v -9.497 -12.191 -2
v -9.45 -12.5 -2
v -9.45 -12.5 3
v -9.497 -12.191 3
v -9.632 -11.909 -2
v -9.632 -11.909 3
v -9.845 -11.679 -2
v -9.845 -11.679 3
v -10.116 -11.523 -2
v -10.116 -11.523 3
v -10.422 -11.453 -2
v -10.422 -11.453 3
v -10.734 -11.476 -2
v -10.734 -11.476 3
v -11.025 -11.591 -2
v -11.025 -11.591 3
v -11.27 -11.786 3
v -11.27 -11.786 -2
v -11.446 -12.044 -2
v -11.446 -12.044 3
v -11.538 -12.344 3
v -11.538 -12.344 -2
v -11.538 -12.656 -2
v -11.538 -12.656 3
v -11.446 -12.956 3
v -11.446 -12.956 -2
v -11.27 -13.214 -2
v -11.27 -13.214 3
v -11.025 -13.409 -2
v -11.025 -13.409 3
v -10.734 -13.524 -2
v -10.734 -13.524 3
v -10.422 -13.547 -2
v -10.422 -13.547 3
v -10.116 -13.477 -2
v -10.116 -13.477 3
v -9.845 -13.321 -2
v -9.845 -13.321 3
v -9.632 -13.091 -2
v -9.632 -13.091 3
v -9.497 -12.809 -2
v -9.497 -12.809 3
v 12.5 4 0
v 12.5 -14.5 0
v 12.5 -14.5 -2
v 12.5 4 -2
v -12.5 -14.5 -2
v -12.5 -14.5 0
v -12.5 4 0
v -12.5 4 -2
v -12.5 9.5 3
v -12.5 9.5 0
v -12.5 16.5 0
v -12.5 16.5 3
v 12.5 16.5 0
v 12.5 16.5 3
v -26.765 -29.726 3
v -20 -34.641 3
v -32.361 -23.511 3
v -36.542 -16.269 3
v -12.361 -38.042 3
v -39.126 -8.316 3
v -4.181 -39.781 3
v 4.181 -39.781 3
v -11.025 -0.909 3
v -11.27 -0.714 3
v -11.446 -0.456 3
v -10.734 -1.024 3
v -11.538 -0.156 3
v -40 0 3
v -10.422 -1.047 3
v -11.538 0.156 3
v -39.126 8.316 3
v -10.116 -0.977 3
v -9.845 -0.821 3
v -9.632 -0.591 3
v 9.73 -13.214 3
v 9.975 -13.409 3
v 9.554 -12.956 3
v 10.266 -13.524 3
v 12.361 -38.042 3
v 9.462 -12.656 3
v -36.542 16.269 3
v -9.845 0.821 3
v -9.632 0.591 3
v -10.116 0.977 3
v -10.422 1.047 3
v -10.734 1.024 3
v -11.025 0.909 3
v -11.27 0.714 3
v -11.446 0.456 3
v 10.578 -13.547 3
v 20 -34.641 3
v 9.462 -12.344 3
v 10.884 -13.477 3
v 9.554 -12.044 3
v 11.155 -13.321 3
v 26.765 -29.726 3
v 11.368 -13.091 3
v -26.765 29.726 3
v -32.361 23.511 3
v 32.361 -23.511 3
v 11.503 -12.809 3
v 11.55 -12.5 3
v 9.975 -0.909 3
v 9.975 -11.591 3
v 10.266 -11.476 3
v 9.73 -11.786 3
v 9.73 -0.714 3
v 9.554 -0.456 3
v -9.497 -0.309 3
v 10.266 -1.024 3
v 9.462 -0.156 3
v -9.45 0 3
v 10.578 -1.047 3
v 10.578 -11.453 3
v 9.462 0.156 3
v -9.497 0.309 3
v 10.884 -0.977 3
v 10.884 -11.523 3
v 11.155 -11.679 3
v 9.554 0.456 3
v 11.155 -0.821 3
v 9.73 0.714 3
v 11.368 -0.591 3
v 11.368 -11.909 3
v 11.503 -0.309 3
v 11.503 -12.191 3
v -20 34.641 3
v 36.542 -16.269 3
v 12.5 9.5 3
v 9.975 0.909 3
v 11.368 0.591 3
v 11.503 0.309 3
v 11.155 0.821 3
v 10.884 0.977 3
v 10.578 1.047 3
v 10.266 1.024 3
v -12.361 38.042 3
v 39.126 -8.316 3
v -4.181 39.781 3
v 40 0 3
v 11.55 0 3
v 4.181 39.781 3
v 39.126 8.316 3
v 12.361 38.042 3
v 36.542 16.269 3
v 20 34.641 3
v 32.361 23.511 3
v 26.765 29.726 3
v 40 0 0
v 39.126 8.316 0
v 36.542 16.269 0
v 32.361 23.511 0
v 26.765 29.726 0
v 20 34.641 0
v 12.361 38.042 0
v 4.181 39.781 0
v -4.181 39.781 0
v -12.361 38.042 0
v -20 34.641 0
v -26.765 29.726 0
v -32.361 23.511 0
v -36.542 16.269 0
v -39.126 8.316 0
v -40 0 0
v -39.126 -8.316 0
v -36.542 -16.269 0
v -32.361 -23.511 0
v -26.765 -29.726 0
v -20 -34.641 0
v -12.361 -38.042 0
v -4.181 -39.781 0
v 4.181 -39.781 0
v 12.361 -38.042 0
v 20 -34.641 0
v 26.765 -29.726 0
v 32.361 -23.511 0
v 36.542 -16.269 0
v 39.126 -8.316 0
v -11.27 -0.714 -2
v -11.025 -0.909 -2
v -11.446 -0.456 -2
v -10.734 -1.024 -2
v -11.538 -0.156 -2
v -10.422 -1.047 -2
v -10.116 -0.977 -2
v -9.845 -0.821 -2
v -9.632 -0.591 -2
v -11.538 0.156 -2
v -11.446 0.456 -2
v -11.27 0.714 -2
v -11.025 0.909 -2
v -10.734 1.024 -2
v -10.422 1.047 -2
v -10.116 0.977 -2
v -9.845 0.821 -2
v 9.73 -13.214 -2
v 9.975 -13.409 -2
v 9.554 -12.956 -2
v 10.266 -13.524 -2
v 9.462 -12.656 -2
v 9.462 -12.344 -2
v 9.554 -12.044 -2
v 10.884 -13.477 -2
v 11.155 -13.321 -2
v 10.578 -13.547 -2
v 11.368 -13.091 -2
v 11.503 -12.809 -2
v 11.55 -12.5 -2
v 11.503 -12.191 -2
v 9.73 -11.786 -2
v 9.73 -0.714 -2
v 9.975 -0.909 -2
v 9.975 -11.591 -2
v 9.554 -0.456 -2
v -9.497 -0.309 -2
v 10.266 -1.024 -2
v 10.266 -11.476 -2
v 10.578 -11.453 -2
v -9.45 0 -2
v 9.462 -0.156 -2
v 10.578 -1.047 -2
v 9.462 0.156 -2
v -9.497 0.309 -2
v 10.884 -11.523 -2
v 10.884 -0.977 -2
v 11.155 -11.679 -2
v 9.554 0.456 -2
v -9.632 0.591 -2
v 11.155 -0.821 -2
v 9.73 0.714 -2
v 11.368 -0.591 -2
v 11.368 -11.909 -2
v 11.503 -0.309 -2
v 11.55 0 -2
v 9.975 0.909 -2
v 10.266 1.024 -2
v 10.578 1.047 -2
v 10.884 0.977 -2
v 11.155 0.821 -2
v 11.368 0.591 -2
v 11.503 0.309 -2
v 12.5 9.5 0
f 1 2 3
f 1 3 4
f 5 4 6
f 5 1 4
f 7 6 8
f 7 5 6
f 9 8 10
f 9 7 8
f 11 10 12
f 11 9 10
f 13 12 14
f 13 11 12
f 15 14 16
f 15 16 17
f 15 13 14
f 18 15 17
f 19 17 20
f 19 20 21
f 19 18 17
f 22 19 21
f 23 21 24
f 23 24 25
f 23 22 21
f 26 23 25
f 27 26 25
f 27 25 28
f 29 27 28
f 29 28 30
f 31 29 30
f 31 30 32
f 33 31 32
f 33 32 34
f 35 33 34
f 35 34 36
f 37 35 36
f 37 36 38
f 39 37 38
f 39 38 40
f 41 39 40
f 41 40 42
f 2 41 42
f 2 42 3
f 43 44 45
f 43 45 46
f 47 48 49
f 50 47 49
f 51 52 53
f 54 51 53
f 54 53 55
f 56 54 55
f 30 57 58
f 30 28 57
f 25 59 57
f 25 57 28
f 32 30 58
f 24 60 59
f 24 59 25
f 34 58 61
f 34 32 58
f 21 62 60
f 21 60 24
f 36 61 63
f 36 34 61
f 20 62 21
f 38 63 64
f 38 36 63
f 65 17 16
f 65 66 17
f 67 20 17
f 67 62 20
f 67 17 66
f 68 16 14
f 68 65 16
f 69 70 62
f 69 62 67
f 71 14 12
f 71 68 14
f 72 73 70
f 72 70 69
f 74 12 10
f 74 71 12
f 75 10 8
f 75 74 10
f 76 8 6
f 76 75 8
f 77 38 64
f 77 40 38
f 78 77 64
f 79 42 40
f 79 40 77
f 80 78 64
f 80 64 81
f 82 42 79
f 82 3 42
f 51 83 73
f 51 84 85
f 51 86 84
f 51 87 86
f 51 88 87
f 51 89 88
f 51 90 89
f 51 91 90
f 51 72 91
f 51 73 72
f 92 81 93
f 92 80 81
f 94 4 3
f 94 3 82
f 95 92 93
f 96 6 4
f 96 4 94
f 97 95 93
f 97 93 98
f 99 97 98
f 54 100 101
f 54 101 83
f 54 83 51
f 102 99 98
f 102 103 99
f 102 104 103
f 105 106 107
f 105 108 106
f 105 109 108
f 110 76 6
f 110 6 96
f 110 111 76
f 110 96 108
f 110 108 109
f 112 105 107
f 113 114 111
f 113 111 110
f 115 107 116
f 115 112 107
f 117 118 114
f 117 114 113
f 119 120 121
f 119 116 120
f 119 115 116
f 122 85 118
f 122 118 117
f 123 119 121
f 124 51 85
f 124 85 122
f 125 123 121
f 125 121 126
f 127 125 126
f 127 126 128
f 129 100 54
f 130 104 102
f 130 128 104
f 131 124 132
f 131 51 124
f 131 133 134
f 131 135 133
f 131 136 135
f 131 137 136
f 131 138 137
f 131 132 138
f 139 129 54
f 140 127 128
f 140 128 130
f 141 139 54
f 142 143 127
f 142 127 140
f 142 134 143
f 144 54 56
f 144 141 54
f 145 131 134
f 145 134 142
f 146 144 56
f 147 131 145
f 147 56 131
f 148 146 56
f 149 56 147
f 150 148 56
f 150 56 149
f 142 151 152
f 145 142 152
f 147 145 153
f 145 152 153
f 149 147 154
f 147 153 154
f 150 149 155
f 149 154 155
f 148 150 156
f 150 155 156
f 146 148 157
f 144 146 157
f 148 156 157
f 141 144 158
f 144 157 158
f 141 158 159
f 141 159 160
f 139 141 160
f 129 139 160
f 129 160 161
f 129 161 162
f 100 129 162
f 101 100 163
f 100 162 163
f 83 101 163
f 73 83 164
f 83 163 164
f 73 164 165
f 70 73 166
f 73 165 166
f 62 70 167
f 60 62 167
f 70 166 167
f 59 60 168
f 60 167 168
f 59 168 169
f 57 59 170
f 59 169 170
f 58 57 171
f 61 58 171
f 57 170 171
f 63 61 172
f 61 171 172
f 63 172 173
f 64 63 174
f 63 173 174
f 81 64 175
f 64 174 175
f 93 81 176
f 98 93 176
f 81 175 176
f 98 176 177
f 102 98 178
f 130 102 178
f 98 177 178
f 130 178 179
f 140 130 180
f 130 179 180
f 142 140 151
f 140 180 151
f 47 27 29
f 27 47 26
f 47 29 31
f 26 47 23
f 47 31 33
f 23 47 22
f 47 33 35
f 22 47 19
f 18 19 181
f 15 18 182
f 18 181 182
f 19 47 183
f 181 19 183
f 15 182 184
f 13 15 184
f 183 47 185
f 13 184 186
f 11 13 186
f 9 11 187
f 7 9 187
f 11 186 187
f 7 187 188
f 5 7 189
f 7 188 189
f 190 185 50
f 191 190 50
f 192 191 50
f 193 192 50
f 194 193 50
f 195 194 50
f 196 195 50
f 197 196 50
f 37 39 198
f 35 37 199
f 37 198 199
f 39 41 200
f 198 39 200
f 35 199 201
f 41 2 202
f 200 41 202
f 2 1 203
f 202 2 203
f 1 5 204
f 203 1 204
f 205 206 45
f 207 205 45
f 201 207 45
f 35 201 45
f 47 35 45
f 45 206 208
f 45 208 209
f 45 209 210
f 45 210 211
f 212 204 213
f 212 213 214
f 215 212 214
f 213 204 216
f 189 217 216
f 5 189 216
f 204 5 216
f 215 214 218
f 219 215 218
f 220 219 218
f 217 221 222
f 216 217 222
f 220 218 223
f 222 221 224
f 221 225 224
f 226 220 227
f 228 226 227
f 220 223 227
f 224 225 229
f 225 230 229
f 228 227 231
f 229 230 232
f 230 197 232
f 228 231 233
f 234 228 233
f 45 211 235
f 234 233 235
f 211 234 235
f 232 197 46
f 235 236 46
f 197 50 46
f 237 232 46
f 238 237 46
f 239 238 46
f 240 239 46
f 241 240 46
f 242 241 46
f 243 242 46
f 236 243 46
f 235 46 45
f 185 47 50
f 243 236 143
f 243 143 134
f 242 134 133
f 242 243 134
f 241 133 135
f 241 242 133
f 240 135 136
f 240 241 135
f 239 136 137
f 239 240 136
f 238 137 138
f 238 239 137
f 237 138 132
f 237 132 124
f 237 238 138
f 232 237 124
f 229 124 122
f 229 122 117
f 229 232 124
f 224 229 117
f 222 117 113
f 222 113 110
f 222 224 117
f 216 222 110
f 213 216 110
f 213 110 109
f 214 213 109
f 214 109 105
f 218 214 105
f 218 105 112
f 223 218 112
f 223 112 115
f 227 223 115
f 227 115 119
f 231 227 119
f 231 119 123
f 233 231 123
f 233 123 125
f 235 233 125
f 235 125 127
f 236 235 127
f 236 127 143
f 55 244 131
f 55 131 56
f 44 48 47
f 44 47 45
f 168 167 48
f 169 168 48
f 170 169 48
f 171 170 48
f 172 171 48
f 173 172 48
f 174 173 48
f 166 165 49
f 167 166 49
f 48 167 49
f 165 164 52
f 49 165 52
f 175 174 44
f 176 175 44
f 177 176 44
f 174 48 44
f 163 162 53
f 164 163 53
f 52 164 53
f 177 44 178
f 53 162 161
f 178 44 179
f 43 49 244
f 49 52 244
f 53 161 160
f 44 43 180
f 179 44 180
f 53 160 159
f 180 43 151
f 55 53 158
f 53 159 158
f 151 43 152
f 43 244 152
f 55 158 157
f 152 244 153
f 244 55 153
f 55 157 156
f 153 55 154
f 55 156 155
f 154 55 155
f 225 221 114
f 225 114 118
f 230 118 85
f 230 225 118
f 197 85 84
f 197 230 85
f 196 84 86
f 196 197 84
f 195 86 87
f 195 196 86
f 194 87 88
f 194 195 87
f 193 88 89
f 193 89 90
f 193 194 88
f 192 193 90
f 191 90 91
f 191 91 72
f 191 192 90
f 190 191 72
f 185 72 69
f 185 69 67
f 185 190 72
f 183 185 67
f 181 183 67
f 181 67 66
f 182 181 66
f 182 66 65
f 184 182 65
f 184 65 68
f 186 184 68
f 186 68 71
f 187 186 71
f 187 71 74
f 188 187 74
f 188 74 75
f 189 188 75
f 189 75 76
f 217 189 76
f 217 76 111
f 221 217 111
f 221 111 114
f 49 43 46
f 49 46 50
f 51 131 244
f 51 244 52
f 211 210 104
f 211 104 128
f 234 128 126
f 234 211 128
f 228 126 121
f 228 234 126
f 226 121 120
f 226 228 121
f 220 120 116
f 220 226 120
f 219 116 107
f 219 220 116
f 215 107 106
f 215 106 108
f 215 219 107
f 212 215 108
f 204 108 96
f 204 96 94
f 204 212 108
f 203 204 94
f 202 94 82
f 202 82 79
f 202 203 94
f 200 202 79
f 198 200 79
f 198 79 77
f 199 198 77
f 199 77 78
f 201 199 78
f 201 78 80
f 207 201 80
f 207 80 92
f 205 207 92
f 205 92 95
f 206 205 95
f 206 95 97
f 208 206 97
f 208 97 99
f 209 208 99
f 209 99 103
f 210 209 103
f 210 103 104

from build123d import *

# Parameters (mm, degrees)
ESQUISSE1_R                  = 40
ESQUISSE1_R_2                = 1.05
BOSS_EXTRU_1_DEPTH           = 3
ESQUISSE2_W                  = 25
ESQUISSE2_H                  = 7
ENL_V_MAT_EXTRU_4_DEPTH      = 14
BOSS_EXTRU_6_DEPTH           = 2
ENL_V_MAT_EXTRU_5_DEPTH      = 2
ESQUISSE2_9_W                = 25
ESQUISSE2_9_H                = 18.5
BOSS_EXTRU_7_DEPTH           = 2
ENL_V_MAT_EXTRU_6_DEPTH      = 57.648036153
ENL_V_MAT_EXTRU_6_DEPTH_BACK = 57.648036153
ESQUISSE7_R                  = 1.05


with BuildPart() as part:
    # Esquisse1 → Boss.-Extru.1 (new body)
    with BuildSketch(Plane.XY):
        Circle(ESQUISSE1_R)
        with Locations((-10.5, -12.5)):
            Circle(ESQUISSE1_R_2, mode=Mode.SUBTRACT)
        with Locations((10.5, -12.5)):
            Circle(ESQUISSE1_R_2, mode=Mode.SUBTRACT)
        with Locations((-10.5, 0)):
            Circle(ESQUISSE1_R_2, mode=Mode.SUBTRACT)
        with Locations((10.5, 0)):
            Circle(ESQUISSE1_R_2, mode=Mode.SUBTRACT)
    extrude(amount=BOSS_EXTRU_1_DEPTH)

    # Esquisse2 → Enlèv. mat.-Extru.4 (cut)
    with BuildSketch(Plane.XY):
        with Locations((0, 13)):
            Rectangle(ESQUISSE2_W, ESQUISSE2_H)
    extrude(amount=ENL_V_MAT_EXTRU_4_DEPTH, mode=Mode.SUBTRACT)

    # Esquisse2<7> → Boss.-Extru.6 (add)
    with BuildSketch(Plane.XY):
        Polygon((12.5, 4), (12.5, 9.5), (-12.5, 9.5), (-12.5, 4), (0, 4), align=None)
    extrude(amount=-BOSS_EXTRU_6_DEPTH)

    # Esquisse2<8> → Enlèv. mat.-Extru.5 (cut)
    with BuildSketch(Plane.XY):
        Polygon((12.5, 4), (12.5, 9.5), (-12.5, 9.5), (-12.5, 4), (0, 4), align=None)
    extrude(amount=-ENL_V_MAT_EXTRU_5_DEPTH, mode=Mode.SUBTRACT)

    # Esquisse2<9> → Boss.-Extru.7 (add)
    with BuildSketch(Plane.XY):
        with Locations((0, -5.25)):
            Rectangle(ESQUISSE2_9_W, ESQUISSE2_9_H)
    extrude(amount=-BOSS_EXTRU_7_DEPTH)

    # Esquisse7 → Enlèv. mat.-Extru.6 (cut, two sides: drawn at the far end of the back side and taken through both)
    with BuildSketch(Plane.XY.offset(-ENL_V_MAT_EXTRU_6_DEPTH_BACK)):
        with Locations((-10.5, 0)):
            Circle(ESQUISSE7_R)
        with Locations((-10.5, -12.5)):
            Circle(ESQUISSE7_R)
        with Locations((10.5, 0)):
            Circle(ESQUISSE7_R)
        with Locations((10.5, -12.5)):
            Circle(ESQUISSE7_R)
    extrude(amount=ENL_V_MAT_EXTRU_6_DEPTH + ENL_V_MAT_EXTRU_6_DEPTH_BACK, mode=Mode.SUBTRACT)


solid = part.part
